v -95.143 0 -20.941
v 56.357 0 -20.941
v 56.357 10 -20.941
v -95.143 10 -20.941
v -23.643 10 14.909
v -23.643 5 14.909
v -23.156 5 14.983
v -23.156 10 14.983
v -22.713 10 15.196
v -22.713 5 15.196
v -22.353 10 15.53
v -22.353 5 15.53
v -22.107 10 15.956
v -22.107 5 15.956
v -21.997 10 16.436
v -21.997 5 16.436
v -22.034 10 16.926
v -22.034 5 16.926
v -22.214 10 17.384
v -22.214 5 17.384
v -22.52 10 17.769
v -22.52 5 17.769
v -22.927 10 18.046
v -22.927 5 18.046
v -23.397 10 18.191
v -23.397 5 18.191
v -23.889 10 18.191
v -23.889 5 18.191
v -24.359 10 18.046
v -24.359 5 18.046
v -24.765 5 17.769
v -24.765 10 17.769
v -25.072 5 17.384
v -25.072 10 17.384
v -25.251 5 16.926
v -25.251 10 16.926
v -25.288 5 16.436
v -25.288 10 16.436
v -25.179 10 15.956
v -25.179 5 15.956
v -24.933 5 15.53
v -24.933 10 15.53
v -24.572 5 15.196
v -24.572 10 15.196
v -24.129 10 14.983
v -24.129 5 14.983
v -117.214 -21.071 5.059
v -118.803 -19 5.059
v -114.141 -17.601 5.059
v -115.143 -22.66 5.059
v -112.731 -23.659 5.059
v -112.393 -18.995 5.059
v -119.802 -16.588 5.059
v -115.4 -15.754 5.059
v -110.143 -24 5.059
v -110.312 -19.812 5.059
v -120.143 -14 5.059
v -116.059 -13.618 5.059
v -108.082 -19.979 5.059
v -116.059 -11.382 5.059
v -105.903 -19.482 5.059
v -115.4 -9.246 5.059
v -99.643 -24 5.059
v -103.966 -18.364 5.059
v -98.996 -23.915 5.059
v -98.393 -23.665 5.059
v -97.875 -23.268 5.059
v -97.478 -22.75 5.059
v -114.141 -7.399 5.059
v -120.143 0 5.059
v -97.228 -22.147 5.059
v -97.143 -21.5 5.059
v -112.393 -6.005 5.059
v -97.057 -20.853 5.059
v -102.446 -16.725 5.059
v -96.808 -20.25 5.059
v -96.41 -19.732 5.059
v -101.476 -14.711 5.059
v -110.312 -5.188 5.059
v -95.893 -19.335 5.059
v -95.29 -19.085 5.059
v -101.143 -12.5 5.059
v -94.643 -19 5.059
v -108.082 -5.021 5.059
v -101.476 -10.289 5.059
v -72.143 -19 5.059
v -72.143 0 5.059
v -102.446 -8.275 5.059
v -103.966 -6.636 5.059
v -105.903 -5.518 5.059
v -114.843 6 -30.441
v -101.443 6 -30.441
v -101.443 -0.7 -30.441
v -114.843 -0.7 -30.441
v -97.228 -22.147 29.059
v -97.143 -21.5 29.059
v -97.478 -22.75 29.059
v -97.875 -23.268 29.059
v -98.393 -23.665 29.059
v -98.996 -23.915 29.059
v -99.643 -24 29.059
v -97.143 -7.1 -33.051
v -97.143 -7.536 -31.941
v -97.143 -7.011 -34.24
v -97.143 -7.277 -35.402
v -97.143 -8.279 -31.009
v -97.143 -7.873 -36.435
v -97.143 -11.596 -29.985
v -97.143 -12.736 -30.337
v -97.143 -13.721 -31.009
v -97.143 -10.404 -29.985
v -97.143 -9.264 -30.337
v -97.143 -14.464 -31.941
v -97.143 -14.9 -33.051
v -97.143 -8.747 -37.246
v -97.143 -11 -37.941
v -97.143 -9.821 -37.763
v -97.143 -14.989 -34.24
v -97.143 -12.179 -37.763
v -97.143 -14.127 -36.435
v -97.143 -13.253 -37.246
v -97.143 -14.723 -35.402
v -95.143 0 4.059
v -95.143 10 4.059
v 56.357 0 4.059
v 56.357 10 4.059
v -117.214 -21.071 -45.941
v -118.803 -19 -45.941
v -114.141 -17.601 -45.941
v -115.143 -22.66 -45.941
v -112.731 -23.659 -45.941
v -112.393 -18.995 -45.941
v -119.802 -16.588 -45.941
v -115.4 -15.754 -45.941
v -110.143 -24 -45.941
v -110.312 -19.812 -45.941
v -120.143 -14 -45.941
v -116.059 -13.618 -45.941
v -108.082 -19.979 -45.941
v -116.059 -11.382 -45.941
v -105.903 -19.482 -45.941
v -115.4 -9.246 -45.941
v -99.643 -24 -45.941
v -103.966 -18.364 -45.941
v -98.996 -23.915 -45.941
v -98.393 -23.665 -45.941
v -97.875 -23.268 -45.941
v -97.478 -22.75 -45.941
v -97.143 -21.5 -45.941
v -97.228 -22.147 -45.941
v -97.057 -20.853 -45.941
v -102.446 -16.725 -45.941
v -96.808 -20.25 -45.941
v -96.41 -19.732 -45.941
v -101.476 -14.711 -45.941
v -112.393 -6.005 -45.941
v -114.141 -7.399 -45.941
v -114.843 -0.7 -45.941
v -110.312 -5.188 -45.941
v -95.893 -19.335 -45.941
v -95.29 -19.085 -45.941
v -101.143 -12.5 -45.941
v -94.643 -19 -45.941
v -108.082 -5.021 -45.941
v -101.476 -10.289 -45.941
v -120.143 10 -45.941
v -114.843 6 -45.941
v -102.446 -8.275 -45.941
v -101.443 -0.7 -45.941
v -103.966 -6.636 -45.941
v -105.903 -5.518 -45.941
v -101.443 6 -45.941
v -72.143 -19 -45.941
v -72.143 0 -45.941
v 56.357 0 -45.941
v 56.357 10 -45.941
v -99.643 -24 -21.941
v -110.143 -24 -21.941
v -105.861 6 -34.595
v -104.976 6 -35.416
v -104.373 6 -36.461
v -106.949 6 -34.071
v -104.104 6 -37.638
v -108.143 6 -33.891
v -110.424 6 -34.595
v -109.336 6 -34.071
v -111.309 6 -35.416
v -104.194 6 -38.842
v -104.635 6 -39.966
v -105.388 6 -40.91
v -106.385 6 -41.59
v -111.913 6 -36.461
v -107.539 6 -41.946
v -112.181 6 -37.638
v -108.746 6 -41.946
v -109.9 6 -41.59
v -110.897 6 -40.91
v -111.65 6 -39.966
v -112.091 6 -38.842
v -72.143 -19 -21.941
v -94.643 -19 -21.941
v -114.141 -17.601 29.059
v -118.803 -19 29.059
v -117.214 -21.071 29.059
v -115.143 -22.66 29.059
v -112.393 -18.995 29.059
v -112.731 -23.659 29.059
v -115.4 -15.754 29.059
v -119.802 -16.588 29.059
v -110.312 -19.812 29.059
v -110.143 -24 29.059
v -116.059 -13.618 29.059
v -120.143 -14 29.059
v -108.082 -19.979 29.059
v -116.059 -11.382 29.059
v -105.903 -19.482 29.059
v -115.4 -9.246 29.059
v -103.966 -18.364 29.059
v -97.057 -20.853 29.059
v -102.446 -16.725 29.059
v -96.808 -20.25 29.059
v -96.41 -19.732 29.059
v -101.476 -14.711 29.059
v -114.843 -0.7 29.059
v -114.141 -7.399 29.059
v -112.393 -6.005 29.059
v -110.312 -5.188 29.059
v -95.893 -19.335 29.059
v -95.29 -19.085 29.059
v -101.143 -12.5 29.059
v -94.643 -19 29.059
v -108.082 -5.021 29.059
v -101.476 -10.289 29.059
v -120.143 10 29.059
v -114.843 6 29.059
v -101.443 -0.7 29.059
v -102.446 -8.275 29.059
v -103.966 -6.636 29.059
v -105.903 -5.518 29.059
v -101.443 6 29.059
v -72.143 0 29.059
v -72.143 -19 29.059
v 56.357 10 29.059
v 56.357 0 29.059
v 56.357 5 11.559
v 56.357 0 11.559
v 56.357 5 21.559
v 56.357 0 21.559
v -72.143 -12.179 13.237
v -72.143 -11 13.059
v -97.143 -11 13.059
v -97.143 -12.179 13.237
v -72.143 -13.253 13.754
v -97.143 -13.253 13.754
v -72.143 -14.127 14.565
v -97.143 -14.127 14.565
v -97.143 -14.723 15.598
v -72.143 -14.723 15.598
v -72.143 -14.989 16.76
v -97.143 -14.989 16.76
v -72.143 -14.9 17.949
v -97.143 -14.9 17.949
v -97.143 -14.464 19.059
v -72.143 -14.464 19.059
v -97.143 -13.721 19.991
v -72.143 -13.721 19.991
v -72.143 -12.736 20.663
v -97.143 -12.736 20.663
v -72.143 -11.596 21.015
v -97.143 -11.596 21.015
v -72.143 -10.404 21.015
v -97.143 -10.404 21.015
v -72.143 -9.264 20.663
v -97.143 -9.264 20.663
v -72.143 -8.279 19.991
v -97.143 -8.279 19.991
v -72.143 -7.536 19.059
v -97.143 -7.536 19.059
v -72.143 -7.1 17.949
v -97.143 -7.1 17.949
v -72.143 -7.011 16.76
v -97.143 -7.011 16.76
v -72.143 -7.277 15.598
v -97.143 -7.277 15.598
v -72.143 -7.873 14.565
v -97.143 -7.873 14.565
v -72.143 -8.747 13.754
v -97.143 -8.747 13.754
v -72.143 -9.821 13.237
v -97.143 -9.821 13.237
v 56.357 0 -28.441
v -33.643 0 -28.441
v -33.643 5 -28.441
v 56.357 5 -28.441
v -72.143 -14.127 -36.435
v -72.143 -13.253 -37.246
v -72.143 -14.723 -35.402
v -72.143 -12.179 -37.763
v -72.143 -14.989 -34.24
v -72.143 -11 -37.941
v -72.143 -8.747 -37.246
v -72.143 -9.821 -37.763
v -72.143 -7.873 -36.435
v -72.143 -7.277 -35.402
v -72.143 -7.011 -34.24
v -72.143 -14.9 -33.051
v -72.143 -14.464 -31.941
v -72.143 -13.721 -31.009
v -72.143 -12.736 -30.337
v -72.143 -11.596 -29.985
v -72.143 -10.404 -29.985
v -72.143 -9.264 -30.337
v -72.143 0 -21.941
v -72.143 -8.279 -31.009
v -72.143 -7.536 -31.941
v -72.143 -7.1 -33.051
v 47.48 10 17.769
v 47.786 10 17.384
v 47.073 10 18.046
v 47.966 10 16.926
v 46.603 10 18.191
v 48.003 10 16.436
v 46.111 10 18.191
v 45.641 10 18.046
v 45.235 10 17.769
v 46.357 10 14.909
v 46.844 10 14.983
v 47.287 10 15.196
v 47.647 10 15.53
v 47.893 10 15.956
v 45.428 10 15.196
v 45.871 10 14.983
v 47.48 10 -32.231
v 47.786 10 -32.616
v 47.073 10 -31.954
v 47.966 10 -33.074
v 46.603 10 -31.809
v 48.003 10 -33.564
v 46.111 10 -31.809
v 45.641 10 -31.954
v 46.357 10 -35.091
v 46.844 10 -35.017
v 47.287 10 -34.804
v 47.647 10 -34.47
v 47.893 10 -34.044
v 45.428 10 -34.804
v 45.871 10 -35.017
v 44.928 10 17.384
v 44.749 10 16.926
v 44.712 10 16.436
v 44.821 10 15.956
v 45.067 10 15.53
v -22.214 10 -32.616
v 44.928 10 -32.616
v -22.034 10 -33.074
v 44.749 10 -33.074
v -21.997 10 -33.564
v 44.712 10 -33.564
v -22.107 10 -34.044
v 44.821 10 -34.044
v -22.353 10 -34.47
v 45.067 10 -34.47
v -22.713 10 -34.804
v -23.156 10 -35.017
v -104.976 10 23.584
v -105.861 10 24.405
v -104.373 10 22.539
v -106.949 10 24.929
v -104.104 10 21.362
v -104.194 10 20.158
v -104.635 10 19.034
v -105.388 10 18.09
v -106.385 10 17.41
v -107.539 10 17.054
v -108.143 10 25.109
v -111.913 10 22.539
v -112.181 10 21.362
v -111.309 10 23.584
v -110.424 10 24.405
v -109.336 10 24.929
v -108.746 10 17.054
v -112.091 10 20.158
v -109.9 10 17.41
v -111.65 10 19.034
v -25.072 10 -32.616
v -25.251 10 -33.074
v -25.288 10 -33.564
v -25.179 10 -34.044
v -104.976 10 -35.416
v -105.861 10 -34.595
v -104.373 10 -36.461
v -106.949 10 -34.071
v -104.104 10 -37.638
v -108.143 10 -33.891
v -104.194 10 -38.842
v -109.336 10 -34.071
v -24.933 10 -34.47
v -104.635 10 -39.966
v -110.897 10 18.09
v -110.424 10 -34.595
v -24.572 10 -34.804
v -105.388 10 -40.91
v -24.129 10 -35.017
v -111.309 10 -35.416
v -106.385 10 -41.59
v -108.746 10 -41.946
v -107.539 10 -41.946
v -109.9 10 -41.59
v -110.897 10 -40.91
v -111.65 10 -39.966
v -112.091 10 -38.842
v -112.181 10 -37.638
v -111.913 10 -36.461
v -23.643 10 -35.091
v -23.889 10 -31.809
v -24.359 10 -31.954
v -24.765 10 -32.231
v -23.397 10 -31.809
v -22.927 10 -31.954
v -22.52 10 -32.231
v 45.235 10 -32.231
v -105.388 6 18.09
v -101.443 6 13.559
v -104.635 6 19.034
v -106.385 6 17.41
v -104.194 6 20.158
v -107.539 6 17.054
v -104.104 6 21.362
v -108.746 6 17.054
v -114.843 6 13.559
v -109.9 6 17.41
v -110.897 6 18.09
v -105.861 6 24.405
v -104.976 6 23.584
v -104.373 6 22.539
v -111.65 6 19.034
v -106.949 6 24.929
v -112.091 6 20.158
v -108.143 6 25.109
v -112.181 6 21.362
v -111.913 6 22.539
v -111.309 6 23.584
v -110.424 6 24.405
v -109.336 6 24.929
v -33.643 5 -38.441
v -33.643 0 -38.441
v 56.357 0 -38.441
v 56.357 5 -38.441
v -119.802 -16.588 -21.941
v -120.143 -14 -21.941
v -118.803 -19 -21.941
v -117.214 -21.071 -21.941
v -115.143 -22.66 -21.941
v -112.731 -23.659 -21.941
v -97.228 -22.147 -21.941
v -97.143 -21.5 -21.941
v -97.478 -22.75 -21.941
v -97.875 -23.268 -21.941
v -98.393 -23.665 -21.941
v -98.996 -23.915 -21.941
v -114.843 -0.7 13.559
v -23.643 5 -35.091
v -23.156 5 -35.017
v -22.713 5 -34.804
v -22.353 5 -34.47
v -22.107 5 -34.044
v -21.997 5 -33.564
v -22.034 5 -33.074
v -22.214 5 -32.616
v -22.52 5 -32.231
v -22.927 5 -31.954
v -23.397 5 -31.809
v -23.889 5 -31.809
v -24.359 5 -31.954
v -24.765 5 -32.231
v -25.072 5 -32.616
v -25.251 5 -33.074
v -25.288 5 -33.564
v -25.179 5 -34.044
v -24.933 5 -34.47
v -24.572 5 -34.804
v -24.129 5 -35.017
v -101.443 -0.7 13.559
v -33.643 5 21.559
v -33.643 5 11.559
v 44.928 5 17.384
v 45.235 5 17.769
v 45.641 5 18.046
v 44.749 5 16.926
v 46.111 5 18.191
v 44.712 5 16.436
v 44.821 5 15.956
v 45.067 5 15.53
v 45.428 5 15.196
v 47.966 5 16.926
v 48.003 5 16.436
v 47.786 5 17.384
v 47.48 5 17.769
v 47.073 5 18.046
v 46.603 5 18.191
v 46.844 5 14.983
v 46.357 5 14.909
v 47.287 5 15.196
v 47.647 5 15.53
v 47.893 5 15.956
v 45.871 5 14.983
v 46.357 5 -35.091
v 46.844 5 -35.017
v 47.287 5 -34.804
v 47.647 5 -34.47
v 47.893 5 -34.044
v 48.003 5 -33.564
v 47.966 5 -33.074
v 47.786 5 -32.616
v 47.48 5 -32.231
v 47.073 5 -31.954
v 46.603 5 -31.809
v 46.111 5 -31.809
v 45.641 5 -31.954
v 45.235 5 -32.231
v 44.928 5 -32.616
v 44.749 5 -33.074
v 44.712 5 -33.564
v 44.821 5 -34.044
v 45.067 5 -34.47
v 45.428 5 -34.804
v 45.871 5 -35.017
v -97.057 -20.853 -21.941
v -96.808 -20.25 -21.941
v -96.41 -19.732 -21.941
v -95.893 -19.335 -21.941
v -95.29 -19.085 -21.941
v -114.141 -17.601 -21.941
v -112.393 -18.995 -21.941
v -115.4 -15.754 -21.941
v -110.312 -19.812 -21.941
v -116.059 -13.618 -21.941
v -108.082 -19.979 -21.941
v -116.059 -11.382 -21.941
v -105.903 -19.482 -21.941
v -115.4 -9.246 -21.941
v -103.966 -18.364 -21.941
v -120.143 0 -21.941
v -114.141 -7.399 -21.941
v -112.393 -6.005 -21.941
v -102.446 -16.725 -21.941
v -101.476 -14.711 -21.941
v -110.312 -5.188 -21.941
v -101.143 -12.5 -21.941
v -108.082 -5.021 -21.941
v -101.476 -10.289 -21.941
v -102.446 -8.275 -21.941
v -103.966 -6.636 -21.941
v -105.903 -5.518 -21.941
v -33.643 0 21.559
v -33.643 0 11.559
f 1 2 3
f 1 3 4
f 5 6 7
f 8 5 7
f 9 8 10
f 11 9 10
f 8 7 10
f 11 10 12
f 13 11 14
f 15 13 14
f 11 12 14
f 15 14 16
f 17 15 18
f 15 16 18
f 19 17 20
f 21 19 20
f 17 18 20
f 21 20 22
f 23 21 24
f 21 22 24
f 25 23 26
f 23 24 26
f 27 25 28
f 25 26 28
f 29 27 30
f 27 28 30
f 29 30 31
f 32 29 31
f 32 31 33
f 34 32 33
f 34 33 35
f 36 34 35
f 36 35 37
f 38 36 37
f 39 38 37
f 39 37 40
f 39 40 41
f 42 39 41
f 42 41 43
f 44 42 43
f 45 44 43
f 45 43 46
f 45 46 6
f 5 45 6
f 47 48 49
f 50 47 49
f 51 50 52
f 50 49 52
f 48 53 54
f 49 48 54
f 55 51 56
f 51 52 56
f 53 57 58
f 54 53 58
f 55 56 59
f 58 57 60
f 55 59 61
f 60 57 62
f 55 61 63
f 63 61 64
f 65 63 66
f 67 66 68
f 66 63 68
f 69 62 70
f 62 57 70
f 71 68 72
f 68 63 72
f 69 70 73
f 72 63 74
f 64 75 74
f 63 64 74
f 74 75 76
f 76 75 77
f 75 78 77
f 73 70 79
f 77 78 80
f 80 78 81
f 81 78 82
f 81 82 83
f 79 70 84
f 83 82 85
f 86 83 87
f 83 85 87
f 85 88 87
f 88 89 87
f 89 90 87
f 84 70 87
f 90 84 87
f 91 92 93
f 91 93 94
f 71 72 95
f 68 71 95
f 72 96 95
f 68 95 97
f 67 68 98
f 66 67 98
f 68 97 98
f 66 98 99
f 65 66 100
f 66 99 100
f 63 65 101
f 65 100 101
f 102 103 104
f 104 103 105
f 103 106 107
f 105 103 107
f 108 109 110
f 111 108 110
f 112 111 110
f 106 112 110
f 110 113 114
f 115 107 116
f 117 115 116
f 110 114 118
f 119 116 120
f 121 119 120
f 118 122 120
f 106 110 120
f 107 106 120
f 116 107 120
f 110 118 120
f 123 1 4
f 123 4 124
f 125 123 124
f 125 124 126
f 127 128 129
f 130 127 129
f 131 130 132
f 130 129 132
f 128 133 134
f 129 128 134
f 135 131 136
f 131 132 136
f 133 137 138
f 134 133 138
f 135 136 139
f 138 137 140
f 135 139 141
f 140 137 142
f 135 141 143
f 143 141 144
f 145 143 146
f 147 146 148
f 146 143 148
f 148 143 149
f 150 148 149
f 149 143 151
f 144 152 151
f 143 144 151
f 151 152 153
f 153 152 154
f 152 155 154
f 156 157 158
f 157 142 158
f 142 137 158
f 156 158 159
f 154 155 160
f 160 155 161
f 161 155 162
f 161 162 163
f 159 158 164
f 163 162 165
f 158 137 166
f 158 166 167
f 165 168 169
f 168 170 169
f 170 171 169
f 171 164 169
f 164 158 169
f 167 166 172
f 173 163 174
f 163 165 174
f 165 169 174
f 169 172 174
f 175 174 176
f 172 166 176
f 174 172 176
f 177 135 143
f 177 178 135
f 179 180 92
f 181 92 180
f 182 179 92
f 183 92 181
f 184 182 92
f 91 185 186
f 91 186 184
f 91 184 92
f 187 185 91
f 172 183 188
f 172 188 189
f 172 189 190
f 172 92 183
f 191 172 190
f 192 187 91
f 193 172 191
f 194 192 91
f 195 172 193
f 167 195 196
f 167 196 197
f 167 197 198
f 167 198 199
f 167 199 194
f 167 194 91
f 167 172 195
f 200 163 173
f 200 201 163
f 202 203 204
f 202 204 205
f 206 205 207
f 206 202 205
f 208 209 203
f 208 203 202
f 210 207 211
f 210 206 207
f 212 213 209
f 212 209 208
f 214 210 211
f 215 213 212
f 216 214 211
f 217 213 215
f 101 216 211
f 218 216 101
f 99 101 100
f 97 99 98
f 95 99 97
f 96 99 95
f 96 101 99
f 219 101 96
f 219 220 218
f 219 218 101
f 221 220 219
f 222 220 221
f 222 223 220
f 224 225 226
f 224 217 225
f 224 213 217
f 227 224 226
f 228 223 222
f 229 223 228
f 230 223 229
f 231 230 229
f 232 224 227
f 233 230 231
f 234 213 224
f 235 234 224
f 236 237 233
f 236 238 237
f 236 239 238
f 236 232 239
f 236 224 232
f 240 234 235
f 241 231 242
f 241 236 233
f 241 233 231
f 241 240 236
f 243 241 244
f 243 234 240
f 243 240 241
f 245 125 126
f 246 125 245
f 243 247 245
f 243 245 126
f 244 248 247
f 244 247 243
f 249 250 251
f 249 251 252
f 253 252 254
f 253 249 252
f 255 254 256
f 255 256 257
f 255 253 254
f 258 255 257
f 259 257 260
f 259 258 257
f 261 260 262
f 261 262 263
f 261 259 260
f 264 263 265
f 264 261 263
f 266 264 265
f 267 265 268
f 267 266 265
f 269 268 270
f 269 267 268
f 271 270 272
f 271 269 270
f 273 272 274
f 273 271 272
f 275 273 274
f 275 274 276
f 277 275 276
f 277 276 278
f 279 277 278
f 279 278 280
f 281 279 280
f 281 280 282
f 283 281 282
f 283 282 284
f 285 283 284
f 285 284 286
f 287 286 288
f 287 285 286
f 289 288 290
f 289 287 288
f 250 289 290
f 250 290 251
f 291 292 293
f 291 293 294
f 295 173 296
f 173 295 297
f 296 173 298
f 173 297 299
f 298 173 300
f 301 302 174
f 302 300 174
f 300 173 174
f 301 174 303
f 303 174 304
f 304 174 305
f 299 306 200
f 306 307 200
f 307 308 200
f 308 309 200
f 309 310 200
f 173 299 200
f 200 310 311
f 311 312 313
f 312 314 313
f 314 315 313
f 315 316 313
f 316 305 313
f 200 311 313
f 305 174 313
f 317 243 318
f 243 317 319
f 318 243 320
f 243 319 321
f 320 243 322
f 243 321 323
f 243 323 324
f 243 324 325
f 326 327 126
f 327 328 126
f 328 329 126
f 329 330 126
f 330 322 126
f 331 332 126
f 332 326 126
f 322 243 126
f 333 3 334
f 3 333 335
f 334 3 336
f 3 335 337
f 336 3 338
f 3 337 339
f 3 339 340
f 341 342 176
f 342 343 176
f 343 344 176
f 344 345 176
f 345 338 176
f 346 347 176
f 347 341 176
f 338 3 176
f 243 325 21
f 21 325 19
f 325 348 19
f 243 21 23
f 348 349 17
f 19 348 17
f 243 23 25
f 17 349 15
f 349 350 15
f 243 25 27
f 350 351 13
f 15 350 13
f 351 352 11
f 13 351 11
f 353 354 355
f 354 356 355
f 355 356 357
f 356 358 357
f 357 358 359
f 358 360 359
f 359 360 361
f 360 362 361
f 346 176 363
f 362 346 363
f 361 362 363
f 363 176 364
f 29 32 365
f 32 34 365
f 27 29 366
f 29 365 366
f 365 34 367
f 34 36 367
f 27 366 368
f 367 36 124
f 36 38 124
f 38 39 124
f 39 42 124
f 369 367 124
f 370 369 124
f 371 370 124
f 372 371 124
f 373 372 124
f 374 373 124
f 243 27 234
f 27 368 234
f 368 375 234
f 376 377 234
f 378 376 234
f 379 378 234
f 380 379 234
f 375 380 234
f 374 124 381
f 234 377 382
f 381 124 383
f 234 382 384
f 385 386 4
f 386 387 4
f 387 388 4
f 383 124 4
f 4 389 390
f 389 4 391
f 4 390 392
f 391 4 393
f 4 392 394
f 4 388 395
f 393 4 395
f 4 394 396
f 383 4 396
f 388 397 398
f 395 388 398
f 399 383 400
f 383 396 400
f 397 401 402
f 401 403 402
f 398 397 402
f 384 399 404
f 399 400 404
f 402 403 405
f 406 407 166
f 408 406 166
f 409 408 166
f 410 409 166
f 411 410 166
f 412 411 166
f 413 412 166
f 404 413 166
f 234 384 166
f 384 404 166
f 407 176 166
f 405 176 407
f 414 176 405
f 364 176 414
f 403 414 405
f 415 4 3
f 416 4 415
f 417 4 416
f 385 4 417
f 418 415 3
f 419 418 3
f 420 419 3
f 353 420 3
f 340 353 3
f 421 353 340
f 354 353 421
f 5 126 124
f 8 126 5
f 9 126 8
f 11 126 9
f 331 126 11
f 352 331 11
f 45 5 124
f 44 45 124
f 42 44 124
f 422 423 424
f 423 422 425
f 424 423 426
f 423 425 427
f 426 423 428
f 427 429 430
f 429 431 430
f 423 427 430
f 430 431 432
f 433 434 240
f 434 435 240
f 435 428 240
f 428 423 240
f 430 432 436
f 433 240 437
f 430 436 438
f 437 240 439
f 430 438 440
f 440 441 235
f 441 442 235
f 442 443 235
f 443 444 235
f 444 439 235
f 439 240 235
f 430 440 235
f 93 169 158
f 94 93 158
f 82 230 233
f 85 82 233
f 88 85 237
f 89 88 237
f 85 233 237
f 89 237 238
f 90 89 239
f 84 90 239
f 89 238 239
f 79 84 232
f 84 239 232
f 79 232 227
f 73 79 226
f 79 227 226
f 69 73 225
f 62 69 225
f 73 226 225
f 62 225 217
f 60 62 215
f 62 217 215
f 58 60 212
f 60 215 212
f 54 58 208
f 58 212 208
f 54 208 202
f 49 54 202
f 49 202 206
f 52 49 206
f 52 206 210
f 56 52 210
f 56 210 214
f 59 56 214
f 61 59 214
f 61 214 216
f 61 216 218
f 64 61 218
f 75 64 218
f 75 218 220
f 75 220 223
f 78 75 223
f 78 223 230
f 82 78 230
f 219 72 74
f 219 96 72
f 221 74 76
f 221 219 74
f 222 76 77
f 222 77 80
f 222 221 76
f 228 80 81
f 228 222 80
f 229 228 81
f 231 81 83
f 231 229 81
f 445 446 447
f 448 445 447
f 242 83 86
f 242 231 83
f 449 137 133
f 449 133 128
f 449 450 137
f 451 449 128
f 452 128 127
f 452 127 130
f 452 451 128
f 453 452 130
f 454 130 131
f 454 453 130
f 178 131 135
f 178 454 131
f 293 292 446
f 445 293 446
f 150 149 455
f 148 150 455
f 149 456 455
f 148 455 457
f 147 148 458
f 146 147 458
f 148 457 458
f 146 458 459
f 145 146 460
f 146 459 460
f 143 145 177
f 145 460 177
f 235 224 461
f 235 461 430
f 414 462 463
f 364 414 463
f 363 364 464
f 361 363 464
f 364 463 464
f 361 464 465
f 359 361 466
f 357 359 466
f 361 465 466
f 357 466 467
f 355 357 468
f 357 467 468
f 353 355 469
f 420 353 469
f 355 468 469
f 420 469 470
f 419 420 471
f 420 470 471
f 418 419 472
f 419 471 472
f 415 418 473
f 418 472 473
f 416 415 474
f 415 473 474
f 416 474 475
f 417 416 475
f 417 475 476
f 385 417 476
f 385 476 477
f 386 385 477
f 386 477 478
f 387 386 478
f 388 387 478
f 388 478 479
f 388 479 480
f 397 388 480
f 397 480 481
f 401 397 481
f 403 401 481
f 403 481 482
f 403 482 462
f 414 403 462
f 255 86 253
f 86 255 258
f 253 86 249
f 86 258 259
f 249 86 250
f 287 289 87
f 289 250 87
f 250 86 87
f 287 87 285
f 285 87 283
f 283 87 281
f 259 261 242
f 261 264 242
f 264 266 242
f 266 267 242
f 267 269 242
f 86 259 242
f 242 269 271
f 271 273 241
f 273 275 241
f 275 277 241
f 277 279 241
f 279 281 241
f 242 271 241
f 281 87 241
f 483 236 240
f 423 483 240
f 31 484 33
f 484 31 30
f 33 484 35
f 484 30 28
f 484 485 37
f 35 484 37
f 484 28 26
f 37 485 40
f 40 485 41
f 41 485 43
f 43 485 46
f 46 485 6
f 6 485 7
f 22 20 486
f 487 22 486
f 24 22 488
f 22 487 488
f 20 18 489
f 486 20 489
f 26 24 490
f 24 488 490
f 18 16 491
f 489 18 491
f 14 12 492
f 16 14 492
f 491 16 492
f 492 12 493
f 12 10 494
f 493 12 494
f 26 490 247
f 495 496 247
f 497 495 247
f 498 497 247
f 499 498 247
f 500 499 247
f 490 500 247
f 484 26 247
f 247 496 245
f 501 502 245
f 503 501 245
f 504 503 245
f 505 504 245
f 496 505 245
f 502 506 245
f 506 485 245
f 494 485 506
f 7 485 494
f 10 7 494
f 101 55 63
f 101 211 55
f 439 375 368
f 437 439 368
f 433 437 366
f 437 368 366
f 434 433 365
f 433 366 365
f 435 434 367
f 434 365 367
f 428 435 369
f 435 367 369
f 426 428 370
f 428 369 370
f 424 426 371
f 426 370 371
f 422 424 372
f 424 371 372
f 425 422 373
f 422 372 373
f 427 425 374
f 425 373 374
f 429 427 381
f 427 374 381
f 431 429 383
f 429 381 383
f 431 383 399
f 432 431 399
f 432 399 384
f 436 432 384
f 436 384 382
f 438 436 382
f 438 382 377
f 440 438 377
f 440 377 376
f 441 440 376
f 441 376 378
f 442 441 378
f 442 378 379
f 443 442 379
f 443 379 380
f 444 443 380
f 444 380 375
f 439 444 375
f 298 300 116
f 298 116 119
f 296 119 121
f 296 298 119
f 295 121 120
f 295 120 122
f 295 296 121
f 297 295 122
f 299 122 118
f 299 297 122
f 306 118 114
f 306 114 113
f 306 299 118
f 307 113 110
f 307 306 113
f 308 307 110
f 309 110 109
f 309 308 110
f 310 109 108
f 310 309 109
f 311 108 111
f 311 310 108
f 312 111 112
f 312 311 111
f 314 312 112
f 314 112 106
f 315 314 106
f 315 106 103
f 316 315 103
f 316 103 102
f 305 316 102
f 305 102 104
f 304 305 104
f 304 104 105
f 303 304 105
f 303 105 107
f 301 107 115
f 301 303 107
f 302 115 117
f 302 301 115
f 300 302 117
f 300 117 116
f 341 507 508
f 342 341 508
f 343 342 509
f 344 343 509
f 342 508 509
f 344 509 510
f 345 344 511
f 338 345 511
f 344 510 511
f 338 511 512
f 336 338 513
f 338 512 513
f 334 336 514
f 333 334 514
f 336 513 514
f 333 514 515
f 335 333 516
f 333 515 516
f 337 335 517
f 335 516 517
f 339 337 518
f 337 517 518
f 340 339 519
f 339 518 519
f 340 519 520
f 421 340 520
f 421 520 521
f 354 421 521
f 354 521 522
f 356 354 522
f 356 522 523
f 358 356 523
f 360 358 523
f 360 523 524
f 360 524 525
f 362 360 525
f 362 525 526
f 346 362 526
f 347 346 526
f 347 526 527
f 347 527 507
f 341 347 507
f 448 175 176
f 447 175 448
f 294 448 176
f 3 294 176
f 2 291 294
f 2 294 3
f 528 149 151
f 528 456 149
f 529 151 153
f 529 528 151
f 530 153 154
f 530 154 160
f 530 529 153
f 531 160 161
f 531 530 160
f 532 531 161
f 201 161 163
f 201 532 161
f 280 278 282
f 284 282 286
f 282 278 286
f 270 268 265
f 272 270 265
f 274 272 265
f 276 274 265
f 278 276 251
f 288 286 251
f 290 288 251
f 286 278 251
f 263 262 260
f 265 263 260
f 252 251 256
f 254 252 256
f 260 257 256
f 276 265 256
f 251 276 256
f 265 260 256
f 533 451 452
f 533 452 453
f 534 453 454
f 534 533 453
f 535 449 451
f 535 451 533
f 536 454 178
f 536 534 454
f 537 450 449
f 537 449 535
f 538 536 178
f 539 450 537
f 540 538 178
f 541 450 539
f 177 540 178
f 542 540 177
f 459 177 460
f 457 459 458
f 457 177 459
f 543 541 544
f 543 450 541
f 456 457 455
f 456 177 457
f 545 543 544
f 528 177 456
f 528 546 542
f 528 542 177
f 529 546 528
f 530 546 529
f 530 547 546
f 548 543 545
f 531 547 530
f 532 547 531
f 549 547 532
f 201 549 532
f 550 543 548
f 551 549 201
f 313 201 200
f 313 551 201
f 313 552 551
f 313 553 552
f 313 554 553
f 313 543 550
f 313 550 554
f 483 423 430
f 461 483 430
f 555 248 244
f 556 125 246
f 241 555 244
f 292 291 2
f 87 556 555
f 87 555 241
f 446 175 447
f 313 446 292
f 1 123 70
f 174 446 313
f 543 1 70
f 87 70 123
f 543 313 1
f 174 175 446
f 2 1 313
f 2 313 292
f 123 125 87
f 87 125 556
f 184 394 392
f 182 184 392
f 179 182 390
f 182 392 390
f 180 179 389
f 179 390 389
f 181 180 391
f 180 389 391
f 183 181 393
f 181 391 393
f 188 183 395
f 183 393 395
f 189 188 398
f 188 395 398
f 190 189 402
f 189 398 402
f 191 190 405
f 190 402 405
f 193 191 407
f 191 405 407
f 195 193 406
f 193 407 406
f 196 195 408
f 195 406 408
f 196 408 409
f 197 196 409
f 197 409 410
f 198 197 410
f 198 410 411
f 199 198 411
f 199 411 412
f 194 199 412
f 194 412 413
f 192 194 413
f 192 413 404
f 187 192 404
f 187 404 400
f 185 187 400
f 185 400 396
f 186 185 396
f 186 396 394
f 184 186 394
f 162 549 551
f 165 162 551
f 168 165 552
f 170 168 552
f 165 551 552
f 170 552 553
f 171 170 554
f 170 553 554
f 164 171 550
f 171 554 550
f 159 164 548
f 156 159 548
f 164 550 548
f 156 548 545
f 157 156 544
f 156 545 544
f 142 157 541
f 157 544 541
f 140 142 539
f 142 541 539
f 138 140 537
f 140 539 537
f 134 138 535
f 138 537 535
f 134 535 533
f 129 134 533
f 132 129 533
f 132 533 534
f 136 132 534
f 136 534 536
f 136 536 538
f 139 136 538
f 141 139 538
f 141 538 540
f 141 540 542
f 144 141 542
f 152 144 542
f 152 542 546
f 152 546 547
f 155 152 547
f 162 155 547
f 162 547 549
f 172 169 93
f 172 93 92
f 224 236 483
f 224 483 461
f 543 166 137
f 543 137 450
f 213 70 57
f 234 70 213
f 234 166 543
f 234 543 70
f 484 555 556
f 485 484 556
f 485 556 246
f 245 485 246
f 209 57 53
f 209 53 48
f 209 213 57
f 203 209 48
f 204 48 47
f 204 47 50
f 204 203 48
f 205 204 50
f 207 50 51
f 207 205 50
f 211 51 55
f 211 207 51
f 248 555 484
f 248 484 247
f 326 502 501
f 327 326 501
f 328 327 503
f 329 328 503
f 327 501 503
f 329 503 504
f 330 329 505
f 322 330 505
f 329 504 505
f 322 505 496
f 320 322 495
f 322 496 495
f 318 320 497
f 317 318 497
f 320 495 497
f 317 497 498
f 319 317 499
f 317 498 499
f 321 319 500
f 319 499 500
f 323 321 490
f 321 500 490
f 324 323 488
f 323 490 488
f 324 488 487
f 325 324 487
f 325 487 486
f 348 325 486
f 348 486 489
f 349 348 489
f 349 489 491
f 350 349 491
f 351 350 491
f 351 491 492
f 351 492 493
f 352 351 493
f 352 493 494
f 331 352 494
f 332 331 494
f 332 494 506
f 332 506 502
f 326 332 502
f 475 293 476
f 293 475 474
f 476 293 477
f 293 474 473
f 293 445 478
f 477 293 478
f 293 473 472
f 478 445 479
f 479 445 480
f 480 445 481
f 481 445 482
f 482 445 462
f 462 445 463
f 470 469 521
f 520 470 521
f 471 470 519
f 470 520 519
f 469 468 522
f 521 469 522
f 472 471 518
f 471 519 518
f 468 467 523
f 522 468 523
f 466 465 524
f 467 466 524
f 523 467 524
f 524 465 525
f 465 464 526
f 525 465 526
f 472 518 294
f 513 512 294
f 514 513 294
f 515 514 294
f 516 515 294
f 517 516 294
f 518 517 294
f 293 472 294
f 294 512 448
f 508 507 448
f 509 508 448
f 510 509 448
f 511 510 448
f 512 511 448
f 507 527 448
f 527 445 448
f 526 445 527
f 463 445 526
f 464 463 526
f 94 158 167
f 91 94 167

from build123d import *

# Parameters (mm, degrees)
BOSS_EXTRUDE1_DEPTH = 10
SKETCH2_W           = 90
SKETCH2_H           = 10
CUT_EXTRUDE1_DEPTH  = 5
SKETCH3_R           = 1.65
CUT_EXTRUDE2_DEPTH  = 129.723786073
SKETCH5_W           = 23
SKETCH5_H           = 24
BOSS_EXTRUDE2_DEPTH = 24
SKETCH6_R           = 7.5
CUT_EXTRUDE3_DEPTH  = 144.649772109
SKETCH7_W           = 25
SKETCH7_H           = 24
BOSS_EXTRUDE3_DEPTH = 19
SKETCH8_R           = 4
CUT_EXTRUDE4_DEPTH  = 25
FILLET2_R           = 10
SKETCH12_W          = 13.4
SKETCH12_H          = 6.7
CUT_EXTRUDE5_DEPTH  = 15.5
CUT_EXTRUDE6_START  = -75
SKETCH12_2_W        = 13.4
SKETCH12_2_H        = 6.7
CUT_EXTRUDE6_DEPTH  = 15.5
CUT_EXTRUDE7_REACH  = 135.044
SKETCH13_R          = 4.05
FILLET3_R           = 2.5


with BuildPart() as part:
    # Sketch1 → Boss-Extrude1 (new body)
    with BuildSketch(Plane(origin=(0, 0, 0), x_dir=(1, 0, 0), z_dir=(0, 1, 0))):
        Polygon((-120.142652821, 45.940788785), (56.357347179, 45.940788785), (56.357347179, 20.940788785), (-95.142652821, 20.940788785), (-95.142652821, -4.059211215), (56.357347179, -4.059211215), (56.357347179, -29.059211215), (-120.142652821, -29.059211215), align=None)
    extrude(amount=BOSS_EXTRUDE1_DEPTH)

    # Sketch2 → Cut-Extrude1 (cut)
    with BuildSketch(Plane(origin=(0, 0, 0), x_dir=(1, 0, 0), z_dir=(0, 1, 0))):
        with Locations((11.357347179, 33.440788785)):
            Rectangle(SKETCH2_W, SKETCH2_H)
        with Locations((11.357347179, -16.559211215)):
            Rectangle(SKETCH2_W, SKETCH2_H)
    extrude(amount=CUT_EXTRUDE1_DEPTH, mode=Mode.SUBTRACT)

    # Sketch3 → Cut-Extrude2 (cut, through all)
    with BuildSketch(Plane(origin=(0, 5, 0), x_dir=(-1, 0, 0), z_dir=(0, -1, 0))):
        with Locations(Location((23.642652821, 33.440788785, 0), (0, 0, 90))):
            Circle(SKETCH3_R)
        with Locations(Location((-46.357347179, 33.440788785, 0), (0, 0, 90))):
            Circle(SKETCH3_R)
        with Locations(Location((23.642652821, -16.559211215, 0), (0, 0, 90))):
            Circle(SKETCH3_R)
        with Locations(Location((-46.357347179, -16.559211215, 0), (0, 0, 90))):
            Circle(SKETCH3_R)
    extrude(amount=-CUT_EXTRUDE2_DEPTH, mode=Mode.SUBTRACT)

    # Sketch5 → Boss-Extrude2 (add)
    with BuildSketch(Plane.XZ):
        with Locations((-108.642652821, 17.059211215)):
            Rectangle(SKETCH5_W, SKETCH5_H)
        with Locations((-108.642652821, -33.940788785)):
            Rectangle(SKETCH5_W, SKETCH5_H)
    extrude(amount=BOSS_EXTRUDE2_DEPTH)

    # Sketch6 → Cut-Extrude3 (cut, through all)
    with BuildSketch(Plane.XY.offset(29.059211215)):
        with Locations((-108.642652821, -12.5)):
            Circle(SKETCH6_R)
    extrude(amount=-CUT_EXTRUDE3_DEPTH, mode=Mode.SUBTRACT)

    # Sketch7 → Boss-Extrude3 (add)
    with BuildSketch(Plane.XZ):
        with Locations((-84.642652821, -33.940788785)):
            Rectangle(SKETCH7_W, SKETCH7_H)
        with Locations((-84.642652821, 17.059211215)):
            Rectangle(SKETCH7_W, SKETCH7_H)
    extrude(amount=BOSS_EXTRUDE3_DEPTH)

    # Sketch8 → Cut-Extrude4 (cut)
    with BuildSketch(Plane.ZY.offset(72.142652821)):
        with Locations(Location((-33.940788785, -11, 0), (0, 0, 180))):
            Circle(SKETCH8_R)
        with Locations(Location((17.059211215, -11, 0), (0, 0, 180))):
            Circle(SKETCH8_R)
    extrude(amount=CUT_EXTRUDE4_DEPTH, mode=Mode.SUBTRACT)

    # Fillet2
    fillet2_edges = [part.edges().sort_by_distance(p)[0] for p in [
        (-120.142652821, -24, 17.059211215),
        (-120.142652821, -24, -33.940788785),
    ]]
    fillet(fillet2_edges, radius=FILLET2_R)

    # Sketch12 → Cut-Extrude5 (cut)
    with BuildSketch(Plane(origin=(0, 0, -45.940788785), x_dir=(-1, 0, 0), z_dir=(0, 0, -1))):
        with Locations((108.142652821, 2.65)):
            Rectangle(SKETCH12_W, SKETCH12_H)
    extrude(amount=-CUT_EXTRUDE5_DEPTH, mode=Mode.SUBTRACT)

    # Sketch12<2> → Cut-Extrude6 (cut)
    with BuildSketch(Plane(origin=(0, 0, -45.940788785), x_dir=(-1, 0, 0), z_dir=(0, 0, -1)).offset(CUT_EXTRUDE6_START)):
        with Locations((108.142652821, 2.65)):
            Rectangle(SKETCH12_2_W, SKETCH12_2_H)
    extrude(amount=CUT_EXTRUDE6_DEPTH, mode=Mode.SUBTRACT)

    # Sketch13 → Cut-Extrude7 (cut, up to next)
    with BuildSketch(Plane(origin=(0, 10, 0), x_dir=(1, 0, 0), z_dir=(0, 1, 0)), mode=Mode.PRIVATE) as cut_extrude7_sk1:
        with Locations(Location((-108.142652821, 37.940788785, 0), (0, 0, 270))):
            Circle(SKETCH13_R)
    cut_extrude7_tool1 = extrude(cut_extrude7_sk1.sketch, amount=-CUT_EXTRUDE7_REACH, mode=Mode.PRIVATE) & part.part
    # Sketch13 → Cut-Extrude7 (cut, up to next)
    with BuildSketch(Plane(origin=(0, 10, 0), x_dir=(1, 0, 0), z_dir=(0, 1, 0)), mode=Mode.PRIVATE) as cut_extrude7_sk2:
        with Locations(Location((-108.142652821, -21.059211215, 0), (0, 0, 270))):
            Circle(SKETCH13_R)
    cut_extrude7_tool2 = extrude(cut_extrude7_sk2.sketch, amount=-CUT_EXTRUDE7_REACH, mode=Mode.PRIVATE) & part.part
    add(cut_extrude7_tool1.solids().sort_by_distance((-108.142653, 10, -37.940789))[0], mode=Mode.SUBTRACT)
    add(cut_extrude7_tool2.solids().sort_by_distance((-108.142653, 10, 21.059211))[0], mode=Mode.SUBTRACT)

    # Fillet3
    fillet3_edges = [part.edges().sort_by_distance(p)[0] for p in [
        (-97.142652821, -19, -33.940788785),
        (-97.142652821, -19, 17.059211215),
    ]]
    fillet(fillet3_edges, radius=FILLET3_R)
    fillet3_2_edges = [part.edges().sort_by_distance(p)[0] for p in [
        (-97.142652821, -24, -33.940788785),
        (-97.142652821, -24, 17.059211215),
    ]]
    fillet(fillet3_2_edges, radius=FILLET3_R - 0.0001)  # a hair under: the kernel refuses the full size


solid = part.part
